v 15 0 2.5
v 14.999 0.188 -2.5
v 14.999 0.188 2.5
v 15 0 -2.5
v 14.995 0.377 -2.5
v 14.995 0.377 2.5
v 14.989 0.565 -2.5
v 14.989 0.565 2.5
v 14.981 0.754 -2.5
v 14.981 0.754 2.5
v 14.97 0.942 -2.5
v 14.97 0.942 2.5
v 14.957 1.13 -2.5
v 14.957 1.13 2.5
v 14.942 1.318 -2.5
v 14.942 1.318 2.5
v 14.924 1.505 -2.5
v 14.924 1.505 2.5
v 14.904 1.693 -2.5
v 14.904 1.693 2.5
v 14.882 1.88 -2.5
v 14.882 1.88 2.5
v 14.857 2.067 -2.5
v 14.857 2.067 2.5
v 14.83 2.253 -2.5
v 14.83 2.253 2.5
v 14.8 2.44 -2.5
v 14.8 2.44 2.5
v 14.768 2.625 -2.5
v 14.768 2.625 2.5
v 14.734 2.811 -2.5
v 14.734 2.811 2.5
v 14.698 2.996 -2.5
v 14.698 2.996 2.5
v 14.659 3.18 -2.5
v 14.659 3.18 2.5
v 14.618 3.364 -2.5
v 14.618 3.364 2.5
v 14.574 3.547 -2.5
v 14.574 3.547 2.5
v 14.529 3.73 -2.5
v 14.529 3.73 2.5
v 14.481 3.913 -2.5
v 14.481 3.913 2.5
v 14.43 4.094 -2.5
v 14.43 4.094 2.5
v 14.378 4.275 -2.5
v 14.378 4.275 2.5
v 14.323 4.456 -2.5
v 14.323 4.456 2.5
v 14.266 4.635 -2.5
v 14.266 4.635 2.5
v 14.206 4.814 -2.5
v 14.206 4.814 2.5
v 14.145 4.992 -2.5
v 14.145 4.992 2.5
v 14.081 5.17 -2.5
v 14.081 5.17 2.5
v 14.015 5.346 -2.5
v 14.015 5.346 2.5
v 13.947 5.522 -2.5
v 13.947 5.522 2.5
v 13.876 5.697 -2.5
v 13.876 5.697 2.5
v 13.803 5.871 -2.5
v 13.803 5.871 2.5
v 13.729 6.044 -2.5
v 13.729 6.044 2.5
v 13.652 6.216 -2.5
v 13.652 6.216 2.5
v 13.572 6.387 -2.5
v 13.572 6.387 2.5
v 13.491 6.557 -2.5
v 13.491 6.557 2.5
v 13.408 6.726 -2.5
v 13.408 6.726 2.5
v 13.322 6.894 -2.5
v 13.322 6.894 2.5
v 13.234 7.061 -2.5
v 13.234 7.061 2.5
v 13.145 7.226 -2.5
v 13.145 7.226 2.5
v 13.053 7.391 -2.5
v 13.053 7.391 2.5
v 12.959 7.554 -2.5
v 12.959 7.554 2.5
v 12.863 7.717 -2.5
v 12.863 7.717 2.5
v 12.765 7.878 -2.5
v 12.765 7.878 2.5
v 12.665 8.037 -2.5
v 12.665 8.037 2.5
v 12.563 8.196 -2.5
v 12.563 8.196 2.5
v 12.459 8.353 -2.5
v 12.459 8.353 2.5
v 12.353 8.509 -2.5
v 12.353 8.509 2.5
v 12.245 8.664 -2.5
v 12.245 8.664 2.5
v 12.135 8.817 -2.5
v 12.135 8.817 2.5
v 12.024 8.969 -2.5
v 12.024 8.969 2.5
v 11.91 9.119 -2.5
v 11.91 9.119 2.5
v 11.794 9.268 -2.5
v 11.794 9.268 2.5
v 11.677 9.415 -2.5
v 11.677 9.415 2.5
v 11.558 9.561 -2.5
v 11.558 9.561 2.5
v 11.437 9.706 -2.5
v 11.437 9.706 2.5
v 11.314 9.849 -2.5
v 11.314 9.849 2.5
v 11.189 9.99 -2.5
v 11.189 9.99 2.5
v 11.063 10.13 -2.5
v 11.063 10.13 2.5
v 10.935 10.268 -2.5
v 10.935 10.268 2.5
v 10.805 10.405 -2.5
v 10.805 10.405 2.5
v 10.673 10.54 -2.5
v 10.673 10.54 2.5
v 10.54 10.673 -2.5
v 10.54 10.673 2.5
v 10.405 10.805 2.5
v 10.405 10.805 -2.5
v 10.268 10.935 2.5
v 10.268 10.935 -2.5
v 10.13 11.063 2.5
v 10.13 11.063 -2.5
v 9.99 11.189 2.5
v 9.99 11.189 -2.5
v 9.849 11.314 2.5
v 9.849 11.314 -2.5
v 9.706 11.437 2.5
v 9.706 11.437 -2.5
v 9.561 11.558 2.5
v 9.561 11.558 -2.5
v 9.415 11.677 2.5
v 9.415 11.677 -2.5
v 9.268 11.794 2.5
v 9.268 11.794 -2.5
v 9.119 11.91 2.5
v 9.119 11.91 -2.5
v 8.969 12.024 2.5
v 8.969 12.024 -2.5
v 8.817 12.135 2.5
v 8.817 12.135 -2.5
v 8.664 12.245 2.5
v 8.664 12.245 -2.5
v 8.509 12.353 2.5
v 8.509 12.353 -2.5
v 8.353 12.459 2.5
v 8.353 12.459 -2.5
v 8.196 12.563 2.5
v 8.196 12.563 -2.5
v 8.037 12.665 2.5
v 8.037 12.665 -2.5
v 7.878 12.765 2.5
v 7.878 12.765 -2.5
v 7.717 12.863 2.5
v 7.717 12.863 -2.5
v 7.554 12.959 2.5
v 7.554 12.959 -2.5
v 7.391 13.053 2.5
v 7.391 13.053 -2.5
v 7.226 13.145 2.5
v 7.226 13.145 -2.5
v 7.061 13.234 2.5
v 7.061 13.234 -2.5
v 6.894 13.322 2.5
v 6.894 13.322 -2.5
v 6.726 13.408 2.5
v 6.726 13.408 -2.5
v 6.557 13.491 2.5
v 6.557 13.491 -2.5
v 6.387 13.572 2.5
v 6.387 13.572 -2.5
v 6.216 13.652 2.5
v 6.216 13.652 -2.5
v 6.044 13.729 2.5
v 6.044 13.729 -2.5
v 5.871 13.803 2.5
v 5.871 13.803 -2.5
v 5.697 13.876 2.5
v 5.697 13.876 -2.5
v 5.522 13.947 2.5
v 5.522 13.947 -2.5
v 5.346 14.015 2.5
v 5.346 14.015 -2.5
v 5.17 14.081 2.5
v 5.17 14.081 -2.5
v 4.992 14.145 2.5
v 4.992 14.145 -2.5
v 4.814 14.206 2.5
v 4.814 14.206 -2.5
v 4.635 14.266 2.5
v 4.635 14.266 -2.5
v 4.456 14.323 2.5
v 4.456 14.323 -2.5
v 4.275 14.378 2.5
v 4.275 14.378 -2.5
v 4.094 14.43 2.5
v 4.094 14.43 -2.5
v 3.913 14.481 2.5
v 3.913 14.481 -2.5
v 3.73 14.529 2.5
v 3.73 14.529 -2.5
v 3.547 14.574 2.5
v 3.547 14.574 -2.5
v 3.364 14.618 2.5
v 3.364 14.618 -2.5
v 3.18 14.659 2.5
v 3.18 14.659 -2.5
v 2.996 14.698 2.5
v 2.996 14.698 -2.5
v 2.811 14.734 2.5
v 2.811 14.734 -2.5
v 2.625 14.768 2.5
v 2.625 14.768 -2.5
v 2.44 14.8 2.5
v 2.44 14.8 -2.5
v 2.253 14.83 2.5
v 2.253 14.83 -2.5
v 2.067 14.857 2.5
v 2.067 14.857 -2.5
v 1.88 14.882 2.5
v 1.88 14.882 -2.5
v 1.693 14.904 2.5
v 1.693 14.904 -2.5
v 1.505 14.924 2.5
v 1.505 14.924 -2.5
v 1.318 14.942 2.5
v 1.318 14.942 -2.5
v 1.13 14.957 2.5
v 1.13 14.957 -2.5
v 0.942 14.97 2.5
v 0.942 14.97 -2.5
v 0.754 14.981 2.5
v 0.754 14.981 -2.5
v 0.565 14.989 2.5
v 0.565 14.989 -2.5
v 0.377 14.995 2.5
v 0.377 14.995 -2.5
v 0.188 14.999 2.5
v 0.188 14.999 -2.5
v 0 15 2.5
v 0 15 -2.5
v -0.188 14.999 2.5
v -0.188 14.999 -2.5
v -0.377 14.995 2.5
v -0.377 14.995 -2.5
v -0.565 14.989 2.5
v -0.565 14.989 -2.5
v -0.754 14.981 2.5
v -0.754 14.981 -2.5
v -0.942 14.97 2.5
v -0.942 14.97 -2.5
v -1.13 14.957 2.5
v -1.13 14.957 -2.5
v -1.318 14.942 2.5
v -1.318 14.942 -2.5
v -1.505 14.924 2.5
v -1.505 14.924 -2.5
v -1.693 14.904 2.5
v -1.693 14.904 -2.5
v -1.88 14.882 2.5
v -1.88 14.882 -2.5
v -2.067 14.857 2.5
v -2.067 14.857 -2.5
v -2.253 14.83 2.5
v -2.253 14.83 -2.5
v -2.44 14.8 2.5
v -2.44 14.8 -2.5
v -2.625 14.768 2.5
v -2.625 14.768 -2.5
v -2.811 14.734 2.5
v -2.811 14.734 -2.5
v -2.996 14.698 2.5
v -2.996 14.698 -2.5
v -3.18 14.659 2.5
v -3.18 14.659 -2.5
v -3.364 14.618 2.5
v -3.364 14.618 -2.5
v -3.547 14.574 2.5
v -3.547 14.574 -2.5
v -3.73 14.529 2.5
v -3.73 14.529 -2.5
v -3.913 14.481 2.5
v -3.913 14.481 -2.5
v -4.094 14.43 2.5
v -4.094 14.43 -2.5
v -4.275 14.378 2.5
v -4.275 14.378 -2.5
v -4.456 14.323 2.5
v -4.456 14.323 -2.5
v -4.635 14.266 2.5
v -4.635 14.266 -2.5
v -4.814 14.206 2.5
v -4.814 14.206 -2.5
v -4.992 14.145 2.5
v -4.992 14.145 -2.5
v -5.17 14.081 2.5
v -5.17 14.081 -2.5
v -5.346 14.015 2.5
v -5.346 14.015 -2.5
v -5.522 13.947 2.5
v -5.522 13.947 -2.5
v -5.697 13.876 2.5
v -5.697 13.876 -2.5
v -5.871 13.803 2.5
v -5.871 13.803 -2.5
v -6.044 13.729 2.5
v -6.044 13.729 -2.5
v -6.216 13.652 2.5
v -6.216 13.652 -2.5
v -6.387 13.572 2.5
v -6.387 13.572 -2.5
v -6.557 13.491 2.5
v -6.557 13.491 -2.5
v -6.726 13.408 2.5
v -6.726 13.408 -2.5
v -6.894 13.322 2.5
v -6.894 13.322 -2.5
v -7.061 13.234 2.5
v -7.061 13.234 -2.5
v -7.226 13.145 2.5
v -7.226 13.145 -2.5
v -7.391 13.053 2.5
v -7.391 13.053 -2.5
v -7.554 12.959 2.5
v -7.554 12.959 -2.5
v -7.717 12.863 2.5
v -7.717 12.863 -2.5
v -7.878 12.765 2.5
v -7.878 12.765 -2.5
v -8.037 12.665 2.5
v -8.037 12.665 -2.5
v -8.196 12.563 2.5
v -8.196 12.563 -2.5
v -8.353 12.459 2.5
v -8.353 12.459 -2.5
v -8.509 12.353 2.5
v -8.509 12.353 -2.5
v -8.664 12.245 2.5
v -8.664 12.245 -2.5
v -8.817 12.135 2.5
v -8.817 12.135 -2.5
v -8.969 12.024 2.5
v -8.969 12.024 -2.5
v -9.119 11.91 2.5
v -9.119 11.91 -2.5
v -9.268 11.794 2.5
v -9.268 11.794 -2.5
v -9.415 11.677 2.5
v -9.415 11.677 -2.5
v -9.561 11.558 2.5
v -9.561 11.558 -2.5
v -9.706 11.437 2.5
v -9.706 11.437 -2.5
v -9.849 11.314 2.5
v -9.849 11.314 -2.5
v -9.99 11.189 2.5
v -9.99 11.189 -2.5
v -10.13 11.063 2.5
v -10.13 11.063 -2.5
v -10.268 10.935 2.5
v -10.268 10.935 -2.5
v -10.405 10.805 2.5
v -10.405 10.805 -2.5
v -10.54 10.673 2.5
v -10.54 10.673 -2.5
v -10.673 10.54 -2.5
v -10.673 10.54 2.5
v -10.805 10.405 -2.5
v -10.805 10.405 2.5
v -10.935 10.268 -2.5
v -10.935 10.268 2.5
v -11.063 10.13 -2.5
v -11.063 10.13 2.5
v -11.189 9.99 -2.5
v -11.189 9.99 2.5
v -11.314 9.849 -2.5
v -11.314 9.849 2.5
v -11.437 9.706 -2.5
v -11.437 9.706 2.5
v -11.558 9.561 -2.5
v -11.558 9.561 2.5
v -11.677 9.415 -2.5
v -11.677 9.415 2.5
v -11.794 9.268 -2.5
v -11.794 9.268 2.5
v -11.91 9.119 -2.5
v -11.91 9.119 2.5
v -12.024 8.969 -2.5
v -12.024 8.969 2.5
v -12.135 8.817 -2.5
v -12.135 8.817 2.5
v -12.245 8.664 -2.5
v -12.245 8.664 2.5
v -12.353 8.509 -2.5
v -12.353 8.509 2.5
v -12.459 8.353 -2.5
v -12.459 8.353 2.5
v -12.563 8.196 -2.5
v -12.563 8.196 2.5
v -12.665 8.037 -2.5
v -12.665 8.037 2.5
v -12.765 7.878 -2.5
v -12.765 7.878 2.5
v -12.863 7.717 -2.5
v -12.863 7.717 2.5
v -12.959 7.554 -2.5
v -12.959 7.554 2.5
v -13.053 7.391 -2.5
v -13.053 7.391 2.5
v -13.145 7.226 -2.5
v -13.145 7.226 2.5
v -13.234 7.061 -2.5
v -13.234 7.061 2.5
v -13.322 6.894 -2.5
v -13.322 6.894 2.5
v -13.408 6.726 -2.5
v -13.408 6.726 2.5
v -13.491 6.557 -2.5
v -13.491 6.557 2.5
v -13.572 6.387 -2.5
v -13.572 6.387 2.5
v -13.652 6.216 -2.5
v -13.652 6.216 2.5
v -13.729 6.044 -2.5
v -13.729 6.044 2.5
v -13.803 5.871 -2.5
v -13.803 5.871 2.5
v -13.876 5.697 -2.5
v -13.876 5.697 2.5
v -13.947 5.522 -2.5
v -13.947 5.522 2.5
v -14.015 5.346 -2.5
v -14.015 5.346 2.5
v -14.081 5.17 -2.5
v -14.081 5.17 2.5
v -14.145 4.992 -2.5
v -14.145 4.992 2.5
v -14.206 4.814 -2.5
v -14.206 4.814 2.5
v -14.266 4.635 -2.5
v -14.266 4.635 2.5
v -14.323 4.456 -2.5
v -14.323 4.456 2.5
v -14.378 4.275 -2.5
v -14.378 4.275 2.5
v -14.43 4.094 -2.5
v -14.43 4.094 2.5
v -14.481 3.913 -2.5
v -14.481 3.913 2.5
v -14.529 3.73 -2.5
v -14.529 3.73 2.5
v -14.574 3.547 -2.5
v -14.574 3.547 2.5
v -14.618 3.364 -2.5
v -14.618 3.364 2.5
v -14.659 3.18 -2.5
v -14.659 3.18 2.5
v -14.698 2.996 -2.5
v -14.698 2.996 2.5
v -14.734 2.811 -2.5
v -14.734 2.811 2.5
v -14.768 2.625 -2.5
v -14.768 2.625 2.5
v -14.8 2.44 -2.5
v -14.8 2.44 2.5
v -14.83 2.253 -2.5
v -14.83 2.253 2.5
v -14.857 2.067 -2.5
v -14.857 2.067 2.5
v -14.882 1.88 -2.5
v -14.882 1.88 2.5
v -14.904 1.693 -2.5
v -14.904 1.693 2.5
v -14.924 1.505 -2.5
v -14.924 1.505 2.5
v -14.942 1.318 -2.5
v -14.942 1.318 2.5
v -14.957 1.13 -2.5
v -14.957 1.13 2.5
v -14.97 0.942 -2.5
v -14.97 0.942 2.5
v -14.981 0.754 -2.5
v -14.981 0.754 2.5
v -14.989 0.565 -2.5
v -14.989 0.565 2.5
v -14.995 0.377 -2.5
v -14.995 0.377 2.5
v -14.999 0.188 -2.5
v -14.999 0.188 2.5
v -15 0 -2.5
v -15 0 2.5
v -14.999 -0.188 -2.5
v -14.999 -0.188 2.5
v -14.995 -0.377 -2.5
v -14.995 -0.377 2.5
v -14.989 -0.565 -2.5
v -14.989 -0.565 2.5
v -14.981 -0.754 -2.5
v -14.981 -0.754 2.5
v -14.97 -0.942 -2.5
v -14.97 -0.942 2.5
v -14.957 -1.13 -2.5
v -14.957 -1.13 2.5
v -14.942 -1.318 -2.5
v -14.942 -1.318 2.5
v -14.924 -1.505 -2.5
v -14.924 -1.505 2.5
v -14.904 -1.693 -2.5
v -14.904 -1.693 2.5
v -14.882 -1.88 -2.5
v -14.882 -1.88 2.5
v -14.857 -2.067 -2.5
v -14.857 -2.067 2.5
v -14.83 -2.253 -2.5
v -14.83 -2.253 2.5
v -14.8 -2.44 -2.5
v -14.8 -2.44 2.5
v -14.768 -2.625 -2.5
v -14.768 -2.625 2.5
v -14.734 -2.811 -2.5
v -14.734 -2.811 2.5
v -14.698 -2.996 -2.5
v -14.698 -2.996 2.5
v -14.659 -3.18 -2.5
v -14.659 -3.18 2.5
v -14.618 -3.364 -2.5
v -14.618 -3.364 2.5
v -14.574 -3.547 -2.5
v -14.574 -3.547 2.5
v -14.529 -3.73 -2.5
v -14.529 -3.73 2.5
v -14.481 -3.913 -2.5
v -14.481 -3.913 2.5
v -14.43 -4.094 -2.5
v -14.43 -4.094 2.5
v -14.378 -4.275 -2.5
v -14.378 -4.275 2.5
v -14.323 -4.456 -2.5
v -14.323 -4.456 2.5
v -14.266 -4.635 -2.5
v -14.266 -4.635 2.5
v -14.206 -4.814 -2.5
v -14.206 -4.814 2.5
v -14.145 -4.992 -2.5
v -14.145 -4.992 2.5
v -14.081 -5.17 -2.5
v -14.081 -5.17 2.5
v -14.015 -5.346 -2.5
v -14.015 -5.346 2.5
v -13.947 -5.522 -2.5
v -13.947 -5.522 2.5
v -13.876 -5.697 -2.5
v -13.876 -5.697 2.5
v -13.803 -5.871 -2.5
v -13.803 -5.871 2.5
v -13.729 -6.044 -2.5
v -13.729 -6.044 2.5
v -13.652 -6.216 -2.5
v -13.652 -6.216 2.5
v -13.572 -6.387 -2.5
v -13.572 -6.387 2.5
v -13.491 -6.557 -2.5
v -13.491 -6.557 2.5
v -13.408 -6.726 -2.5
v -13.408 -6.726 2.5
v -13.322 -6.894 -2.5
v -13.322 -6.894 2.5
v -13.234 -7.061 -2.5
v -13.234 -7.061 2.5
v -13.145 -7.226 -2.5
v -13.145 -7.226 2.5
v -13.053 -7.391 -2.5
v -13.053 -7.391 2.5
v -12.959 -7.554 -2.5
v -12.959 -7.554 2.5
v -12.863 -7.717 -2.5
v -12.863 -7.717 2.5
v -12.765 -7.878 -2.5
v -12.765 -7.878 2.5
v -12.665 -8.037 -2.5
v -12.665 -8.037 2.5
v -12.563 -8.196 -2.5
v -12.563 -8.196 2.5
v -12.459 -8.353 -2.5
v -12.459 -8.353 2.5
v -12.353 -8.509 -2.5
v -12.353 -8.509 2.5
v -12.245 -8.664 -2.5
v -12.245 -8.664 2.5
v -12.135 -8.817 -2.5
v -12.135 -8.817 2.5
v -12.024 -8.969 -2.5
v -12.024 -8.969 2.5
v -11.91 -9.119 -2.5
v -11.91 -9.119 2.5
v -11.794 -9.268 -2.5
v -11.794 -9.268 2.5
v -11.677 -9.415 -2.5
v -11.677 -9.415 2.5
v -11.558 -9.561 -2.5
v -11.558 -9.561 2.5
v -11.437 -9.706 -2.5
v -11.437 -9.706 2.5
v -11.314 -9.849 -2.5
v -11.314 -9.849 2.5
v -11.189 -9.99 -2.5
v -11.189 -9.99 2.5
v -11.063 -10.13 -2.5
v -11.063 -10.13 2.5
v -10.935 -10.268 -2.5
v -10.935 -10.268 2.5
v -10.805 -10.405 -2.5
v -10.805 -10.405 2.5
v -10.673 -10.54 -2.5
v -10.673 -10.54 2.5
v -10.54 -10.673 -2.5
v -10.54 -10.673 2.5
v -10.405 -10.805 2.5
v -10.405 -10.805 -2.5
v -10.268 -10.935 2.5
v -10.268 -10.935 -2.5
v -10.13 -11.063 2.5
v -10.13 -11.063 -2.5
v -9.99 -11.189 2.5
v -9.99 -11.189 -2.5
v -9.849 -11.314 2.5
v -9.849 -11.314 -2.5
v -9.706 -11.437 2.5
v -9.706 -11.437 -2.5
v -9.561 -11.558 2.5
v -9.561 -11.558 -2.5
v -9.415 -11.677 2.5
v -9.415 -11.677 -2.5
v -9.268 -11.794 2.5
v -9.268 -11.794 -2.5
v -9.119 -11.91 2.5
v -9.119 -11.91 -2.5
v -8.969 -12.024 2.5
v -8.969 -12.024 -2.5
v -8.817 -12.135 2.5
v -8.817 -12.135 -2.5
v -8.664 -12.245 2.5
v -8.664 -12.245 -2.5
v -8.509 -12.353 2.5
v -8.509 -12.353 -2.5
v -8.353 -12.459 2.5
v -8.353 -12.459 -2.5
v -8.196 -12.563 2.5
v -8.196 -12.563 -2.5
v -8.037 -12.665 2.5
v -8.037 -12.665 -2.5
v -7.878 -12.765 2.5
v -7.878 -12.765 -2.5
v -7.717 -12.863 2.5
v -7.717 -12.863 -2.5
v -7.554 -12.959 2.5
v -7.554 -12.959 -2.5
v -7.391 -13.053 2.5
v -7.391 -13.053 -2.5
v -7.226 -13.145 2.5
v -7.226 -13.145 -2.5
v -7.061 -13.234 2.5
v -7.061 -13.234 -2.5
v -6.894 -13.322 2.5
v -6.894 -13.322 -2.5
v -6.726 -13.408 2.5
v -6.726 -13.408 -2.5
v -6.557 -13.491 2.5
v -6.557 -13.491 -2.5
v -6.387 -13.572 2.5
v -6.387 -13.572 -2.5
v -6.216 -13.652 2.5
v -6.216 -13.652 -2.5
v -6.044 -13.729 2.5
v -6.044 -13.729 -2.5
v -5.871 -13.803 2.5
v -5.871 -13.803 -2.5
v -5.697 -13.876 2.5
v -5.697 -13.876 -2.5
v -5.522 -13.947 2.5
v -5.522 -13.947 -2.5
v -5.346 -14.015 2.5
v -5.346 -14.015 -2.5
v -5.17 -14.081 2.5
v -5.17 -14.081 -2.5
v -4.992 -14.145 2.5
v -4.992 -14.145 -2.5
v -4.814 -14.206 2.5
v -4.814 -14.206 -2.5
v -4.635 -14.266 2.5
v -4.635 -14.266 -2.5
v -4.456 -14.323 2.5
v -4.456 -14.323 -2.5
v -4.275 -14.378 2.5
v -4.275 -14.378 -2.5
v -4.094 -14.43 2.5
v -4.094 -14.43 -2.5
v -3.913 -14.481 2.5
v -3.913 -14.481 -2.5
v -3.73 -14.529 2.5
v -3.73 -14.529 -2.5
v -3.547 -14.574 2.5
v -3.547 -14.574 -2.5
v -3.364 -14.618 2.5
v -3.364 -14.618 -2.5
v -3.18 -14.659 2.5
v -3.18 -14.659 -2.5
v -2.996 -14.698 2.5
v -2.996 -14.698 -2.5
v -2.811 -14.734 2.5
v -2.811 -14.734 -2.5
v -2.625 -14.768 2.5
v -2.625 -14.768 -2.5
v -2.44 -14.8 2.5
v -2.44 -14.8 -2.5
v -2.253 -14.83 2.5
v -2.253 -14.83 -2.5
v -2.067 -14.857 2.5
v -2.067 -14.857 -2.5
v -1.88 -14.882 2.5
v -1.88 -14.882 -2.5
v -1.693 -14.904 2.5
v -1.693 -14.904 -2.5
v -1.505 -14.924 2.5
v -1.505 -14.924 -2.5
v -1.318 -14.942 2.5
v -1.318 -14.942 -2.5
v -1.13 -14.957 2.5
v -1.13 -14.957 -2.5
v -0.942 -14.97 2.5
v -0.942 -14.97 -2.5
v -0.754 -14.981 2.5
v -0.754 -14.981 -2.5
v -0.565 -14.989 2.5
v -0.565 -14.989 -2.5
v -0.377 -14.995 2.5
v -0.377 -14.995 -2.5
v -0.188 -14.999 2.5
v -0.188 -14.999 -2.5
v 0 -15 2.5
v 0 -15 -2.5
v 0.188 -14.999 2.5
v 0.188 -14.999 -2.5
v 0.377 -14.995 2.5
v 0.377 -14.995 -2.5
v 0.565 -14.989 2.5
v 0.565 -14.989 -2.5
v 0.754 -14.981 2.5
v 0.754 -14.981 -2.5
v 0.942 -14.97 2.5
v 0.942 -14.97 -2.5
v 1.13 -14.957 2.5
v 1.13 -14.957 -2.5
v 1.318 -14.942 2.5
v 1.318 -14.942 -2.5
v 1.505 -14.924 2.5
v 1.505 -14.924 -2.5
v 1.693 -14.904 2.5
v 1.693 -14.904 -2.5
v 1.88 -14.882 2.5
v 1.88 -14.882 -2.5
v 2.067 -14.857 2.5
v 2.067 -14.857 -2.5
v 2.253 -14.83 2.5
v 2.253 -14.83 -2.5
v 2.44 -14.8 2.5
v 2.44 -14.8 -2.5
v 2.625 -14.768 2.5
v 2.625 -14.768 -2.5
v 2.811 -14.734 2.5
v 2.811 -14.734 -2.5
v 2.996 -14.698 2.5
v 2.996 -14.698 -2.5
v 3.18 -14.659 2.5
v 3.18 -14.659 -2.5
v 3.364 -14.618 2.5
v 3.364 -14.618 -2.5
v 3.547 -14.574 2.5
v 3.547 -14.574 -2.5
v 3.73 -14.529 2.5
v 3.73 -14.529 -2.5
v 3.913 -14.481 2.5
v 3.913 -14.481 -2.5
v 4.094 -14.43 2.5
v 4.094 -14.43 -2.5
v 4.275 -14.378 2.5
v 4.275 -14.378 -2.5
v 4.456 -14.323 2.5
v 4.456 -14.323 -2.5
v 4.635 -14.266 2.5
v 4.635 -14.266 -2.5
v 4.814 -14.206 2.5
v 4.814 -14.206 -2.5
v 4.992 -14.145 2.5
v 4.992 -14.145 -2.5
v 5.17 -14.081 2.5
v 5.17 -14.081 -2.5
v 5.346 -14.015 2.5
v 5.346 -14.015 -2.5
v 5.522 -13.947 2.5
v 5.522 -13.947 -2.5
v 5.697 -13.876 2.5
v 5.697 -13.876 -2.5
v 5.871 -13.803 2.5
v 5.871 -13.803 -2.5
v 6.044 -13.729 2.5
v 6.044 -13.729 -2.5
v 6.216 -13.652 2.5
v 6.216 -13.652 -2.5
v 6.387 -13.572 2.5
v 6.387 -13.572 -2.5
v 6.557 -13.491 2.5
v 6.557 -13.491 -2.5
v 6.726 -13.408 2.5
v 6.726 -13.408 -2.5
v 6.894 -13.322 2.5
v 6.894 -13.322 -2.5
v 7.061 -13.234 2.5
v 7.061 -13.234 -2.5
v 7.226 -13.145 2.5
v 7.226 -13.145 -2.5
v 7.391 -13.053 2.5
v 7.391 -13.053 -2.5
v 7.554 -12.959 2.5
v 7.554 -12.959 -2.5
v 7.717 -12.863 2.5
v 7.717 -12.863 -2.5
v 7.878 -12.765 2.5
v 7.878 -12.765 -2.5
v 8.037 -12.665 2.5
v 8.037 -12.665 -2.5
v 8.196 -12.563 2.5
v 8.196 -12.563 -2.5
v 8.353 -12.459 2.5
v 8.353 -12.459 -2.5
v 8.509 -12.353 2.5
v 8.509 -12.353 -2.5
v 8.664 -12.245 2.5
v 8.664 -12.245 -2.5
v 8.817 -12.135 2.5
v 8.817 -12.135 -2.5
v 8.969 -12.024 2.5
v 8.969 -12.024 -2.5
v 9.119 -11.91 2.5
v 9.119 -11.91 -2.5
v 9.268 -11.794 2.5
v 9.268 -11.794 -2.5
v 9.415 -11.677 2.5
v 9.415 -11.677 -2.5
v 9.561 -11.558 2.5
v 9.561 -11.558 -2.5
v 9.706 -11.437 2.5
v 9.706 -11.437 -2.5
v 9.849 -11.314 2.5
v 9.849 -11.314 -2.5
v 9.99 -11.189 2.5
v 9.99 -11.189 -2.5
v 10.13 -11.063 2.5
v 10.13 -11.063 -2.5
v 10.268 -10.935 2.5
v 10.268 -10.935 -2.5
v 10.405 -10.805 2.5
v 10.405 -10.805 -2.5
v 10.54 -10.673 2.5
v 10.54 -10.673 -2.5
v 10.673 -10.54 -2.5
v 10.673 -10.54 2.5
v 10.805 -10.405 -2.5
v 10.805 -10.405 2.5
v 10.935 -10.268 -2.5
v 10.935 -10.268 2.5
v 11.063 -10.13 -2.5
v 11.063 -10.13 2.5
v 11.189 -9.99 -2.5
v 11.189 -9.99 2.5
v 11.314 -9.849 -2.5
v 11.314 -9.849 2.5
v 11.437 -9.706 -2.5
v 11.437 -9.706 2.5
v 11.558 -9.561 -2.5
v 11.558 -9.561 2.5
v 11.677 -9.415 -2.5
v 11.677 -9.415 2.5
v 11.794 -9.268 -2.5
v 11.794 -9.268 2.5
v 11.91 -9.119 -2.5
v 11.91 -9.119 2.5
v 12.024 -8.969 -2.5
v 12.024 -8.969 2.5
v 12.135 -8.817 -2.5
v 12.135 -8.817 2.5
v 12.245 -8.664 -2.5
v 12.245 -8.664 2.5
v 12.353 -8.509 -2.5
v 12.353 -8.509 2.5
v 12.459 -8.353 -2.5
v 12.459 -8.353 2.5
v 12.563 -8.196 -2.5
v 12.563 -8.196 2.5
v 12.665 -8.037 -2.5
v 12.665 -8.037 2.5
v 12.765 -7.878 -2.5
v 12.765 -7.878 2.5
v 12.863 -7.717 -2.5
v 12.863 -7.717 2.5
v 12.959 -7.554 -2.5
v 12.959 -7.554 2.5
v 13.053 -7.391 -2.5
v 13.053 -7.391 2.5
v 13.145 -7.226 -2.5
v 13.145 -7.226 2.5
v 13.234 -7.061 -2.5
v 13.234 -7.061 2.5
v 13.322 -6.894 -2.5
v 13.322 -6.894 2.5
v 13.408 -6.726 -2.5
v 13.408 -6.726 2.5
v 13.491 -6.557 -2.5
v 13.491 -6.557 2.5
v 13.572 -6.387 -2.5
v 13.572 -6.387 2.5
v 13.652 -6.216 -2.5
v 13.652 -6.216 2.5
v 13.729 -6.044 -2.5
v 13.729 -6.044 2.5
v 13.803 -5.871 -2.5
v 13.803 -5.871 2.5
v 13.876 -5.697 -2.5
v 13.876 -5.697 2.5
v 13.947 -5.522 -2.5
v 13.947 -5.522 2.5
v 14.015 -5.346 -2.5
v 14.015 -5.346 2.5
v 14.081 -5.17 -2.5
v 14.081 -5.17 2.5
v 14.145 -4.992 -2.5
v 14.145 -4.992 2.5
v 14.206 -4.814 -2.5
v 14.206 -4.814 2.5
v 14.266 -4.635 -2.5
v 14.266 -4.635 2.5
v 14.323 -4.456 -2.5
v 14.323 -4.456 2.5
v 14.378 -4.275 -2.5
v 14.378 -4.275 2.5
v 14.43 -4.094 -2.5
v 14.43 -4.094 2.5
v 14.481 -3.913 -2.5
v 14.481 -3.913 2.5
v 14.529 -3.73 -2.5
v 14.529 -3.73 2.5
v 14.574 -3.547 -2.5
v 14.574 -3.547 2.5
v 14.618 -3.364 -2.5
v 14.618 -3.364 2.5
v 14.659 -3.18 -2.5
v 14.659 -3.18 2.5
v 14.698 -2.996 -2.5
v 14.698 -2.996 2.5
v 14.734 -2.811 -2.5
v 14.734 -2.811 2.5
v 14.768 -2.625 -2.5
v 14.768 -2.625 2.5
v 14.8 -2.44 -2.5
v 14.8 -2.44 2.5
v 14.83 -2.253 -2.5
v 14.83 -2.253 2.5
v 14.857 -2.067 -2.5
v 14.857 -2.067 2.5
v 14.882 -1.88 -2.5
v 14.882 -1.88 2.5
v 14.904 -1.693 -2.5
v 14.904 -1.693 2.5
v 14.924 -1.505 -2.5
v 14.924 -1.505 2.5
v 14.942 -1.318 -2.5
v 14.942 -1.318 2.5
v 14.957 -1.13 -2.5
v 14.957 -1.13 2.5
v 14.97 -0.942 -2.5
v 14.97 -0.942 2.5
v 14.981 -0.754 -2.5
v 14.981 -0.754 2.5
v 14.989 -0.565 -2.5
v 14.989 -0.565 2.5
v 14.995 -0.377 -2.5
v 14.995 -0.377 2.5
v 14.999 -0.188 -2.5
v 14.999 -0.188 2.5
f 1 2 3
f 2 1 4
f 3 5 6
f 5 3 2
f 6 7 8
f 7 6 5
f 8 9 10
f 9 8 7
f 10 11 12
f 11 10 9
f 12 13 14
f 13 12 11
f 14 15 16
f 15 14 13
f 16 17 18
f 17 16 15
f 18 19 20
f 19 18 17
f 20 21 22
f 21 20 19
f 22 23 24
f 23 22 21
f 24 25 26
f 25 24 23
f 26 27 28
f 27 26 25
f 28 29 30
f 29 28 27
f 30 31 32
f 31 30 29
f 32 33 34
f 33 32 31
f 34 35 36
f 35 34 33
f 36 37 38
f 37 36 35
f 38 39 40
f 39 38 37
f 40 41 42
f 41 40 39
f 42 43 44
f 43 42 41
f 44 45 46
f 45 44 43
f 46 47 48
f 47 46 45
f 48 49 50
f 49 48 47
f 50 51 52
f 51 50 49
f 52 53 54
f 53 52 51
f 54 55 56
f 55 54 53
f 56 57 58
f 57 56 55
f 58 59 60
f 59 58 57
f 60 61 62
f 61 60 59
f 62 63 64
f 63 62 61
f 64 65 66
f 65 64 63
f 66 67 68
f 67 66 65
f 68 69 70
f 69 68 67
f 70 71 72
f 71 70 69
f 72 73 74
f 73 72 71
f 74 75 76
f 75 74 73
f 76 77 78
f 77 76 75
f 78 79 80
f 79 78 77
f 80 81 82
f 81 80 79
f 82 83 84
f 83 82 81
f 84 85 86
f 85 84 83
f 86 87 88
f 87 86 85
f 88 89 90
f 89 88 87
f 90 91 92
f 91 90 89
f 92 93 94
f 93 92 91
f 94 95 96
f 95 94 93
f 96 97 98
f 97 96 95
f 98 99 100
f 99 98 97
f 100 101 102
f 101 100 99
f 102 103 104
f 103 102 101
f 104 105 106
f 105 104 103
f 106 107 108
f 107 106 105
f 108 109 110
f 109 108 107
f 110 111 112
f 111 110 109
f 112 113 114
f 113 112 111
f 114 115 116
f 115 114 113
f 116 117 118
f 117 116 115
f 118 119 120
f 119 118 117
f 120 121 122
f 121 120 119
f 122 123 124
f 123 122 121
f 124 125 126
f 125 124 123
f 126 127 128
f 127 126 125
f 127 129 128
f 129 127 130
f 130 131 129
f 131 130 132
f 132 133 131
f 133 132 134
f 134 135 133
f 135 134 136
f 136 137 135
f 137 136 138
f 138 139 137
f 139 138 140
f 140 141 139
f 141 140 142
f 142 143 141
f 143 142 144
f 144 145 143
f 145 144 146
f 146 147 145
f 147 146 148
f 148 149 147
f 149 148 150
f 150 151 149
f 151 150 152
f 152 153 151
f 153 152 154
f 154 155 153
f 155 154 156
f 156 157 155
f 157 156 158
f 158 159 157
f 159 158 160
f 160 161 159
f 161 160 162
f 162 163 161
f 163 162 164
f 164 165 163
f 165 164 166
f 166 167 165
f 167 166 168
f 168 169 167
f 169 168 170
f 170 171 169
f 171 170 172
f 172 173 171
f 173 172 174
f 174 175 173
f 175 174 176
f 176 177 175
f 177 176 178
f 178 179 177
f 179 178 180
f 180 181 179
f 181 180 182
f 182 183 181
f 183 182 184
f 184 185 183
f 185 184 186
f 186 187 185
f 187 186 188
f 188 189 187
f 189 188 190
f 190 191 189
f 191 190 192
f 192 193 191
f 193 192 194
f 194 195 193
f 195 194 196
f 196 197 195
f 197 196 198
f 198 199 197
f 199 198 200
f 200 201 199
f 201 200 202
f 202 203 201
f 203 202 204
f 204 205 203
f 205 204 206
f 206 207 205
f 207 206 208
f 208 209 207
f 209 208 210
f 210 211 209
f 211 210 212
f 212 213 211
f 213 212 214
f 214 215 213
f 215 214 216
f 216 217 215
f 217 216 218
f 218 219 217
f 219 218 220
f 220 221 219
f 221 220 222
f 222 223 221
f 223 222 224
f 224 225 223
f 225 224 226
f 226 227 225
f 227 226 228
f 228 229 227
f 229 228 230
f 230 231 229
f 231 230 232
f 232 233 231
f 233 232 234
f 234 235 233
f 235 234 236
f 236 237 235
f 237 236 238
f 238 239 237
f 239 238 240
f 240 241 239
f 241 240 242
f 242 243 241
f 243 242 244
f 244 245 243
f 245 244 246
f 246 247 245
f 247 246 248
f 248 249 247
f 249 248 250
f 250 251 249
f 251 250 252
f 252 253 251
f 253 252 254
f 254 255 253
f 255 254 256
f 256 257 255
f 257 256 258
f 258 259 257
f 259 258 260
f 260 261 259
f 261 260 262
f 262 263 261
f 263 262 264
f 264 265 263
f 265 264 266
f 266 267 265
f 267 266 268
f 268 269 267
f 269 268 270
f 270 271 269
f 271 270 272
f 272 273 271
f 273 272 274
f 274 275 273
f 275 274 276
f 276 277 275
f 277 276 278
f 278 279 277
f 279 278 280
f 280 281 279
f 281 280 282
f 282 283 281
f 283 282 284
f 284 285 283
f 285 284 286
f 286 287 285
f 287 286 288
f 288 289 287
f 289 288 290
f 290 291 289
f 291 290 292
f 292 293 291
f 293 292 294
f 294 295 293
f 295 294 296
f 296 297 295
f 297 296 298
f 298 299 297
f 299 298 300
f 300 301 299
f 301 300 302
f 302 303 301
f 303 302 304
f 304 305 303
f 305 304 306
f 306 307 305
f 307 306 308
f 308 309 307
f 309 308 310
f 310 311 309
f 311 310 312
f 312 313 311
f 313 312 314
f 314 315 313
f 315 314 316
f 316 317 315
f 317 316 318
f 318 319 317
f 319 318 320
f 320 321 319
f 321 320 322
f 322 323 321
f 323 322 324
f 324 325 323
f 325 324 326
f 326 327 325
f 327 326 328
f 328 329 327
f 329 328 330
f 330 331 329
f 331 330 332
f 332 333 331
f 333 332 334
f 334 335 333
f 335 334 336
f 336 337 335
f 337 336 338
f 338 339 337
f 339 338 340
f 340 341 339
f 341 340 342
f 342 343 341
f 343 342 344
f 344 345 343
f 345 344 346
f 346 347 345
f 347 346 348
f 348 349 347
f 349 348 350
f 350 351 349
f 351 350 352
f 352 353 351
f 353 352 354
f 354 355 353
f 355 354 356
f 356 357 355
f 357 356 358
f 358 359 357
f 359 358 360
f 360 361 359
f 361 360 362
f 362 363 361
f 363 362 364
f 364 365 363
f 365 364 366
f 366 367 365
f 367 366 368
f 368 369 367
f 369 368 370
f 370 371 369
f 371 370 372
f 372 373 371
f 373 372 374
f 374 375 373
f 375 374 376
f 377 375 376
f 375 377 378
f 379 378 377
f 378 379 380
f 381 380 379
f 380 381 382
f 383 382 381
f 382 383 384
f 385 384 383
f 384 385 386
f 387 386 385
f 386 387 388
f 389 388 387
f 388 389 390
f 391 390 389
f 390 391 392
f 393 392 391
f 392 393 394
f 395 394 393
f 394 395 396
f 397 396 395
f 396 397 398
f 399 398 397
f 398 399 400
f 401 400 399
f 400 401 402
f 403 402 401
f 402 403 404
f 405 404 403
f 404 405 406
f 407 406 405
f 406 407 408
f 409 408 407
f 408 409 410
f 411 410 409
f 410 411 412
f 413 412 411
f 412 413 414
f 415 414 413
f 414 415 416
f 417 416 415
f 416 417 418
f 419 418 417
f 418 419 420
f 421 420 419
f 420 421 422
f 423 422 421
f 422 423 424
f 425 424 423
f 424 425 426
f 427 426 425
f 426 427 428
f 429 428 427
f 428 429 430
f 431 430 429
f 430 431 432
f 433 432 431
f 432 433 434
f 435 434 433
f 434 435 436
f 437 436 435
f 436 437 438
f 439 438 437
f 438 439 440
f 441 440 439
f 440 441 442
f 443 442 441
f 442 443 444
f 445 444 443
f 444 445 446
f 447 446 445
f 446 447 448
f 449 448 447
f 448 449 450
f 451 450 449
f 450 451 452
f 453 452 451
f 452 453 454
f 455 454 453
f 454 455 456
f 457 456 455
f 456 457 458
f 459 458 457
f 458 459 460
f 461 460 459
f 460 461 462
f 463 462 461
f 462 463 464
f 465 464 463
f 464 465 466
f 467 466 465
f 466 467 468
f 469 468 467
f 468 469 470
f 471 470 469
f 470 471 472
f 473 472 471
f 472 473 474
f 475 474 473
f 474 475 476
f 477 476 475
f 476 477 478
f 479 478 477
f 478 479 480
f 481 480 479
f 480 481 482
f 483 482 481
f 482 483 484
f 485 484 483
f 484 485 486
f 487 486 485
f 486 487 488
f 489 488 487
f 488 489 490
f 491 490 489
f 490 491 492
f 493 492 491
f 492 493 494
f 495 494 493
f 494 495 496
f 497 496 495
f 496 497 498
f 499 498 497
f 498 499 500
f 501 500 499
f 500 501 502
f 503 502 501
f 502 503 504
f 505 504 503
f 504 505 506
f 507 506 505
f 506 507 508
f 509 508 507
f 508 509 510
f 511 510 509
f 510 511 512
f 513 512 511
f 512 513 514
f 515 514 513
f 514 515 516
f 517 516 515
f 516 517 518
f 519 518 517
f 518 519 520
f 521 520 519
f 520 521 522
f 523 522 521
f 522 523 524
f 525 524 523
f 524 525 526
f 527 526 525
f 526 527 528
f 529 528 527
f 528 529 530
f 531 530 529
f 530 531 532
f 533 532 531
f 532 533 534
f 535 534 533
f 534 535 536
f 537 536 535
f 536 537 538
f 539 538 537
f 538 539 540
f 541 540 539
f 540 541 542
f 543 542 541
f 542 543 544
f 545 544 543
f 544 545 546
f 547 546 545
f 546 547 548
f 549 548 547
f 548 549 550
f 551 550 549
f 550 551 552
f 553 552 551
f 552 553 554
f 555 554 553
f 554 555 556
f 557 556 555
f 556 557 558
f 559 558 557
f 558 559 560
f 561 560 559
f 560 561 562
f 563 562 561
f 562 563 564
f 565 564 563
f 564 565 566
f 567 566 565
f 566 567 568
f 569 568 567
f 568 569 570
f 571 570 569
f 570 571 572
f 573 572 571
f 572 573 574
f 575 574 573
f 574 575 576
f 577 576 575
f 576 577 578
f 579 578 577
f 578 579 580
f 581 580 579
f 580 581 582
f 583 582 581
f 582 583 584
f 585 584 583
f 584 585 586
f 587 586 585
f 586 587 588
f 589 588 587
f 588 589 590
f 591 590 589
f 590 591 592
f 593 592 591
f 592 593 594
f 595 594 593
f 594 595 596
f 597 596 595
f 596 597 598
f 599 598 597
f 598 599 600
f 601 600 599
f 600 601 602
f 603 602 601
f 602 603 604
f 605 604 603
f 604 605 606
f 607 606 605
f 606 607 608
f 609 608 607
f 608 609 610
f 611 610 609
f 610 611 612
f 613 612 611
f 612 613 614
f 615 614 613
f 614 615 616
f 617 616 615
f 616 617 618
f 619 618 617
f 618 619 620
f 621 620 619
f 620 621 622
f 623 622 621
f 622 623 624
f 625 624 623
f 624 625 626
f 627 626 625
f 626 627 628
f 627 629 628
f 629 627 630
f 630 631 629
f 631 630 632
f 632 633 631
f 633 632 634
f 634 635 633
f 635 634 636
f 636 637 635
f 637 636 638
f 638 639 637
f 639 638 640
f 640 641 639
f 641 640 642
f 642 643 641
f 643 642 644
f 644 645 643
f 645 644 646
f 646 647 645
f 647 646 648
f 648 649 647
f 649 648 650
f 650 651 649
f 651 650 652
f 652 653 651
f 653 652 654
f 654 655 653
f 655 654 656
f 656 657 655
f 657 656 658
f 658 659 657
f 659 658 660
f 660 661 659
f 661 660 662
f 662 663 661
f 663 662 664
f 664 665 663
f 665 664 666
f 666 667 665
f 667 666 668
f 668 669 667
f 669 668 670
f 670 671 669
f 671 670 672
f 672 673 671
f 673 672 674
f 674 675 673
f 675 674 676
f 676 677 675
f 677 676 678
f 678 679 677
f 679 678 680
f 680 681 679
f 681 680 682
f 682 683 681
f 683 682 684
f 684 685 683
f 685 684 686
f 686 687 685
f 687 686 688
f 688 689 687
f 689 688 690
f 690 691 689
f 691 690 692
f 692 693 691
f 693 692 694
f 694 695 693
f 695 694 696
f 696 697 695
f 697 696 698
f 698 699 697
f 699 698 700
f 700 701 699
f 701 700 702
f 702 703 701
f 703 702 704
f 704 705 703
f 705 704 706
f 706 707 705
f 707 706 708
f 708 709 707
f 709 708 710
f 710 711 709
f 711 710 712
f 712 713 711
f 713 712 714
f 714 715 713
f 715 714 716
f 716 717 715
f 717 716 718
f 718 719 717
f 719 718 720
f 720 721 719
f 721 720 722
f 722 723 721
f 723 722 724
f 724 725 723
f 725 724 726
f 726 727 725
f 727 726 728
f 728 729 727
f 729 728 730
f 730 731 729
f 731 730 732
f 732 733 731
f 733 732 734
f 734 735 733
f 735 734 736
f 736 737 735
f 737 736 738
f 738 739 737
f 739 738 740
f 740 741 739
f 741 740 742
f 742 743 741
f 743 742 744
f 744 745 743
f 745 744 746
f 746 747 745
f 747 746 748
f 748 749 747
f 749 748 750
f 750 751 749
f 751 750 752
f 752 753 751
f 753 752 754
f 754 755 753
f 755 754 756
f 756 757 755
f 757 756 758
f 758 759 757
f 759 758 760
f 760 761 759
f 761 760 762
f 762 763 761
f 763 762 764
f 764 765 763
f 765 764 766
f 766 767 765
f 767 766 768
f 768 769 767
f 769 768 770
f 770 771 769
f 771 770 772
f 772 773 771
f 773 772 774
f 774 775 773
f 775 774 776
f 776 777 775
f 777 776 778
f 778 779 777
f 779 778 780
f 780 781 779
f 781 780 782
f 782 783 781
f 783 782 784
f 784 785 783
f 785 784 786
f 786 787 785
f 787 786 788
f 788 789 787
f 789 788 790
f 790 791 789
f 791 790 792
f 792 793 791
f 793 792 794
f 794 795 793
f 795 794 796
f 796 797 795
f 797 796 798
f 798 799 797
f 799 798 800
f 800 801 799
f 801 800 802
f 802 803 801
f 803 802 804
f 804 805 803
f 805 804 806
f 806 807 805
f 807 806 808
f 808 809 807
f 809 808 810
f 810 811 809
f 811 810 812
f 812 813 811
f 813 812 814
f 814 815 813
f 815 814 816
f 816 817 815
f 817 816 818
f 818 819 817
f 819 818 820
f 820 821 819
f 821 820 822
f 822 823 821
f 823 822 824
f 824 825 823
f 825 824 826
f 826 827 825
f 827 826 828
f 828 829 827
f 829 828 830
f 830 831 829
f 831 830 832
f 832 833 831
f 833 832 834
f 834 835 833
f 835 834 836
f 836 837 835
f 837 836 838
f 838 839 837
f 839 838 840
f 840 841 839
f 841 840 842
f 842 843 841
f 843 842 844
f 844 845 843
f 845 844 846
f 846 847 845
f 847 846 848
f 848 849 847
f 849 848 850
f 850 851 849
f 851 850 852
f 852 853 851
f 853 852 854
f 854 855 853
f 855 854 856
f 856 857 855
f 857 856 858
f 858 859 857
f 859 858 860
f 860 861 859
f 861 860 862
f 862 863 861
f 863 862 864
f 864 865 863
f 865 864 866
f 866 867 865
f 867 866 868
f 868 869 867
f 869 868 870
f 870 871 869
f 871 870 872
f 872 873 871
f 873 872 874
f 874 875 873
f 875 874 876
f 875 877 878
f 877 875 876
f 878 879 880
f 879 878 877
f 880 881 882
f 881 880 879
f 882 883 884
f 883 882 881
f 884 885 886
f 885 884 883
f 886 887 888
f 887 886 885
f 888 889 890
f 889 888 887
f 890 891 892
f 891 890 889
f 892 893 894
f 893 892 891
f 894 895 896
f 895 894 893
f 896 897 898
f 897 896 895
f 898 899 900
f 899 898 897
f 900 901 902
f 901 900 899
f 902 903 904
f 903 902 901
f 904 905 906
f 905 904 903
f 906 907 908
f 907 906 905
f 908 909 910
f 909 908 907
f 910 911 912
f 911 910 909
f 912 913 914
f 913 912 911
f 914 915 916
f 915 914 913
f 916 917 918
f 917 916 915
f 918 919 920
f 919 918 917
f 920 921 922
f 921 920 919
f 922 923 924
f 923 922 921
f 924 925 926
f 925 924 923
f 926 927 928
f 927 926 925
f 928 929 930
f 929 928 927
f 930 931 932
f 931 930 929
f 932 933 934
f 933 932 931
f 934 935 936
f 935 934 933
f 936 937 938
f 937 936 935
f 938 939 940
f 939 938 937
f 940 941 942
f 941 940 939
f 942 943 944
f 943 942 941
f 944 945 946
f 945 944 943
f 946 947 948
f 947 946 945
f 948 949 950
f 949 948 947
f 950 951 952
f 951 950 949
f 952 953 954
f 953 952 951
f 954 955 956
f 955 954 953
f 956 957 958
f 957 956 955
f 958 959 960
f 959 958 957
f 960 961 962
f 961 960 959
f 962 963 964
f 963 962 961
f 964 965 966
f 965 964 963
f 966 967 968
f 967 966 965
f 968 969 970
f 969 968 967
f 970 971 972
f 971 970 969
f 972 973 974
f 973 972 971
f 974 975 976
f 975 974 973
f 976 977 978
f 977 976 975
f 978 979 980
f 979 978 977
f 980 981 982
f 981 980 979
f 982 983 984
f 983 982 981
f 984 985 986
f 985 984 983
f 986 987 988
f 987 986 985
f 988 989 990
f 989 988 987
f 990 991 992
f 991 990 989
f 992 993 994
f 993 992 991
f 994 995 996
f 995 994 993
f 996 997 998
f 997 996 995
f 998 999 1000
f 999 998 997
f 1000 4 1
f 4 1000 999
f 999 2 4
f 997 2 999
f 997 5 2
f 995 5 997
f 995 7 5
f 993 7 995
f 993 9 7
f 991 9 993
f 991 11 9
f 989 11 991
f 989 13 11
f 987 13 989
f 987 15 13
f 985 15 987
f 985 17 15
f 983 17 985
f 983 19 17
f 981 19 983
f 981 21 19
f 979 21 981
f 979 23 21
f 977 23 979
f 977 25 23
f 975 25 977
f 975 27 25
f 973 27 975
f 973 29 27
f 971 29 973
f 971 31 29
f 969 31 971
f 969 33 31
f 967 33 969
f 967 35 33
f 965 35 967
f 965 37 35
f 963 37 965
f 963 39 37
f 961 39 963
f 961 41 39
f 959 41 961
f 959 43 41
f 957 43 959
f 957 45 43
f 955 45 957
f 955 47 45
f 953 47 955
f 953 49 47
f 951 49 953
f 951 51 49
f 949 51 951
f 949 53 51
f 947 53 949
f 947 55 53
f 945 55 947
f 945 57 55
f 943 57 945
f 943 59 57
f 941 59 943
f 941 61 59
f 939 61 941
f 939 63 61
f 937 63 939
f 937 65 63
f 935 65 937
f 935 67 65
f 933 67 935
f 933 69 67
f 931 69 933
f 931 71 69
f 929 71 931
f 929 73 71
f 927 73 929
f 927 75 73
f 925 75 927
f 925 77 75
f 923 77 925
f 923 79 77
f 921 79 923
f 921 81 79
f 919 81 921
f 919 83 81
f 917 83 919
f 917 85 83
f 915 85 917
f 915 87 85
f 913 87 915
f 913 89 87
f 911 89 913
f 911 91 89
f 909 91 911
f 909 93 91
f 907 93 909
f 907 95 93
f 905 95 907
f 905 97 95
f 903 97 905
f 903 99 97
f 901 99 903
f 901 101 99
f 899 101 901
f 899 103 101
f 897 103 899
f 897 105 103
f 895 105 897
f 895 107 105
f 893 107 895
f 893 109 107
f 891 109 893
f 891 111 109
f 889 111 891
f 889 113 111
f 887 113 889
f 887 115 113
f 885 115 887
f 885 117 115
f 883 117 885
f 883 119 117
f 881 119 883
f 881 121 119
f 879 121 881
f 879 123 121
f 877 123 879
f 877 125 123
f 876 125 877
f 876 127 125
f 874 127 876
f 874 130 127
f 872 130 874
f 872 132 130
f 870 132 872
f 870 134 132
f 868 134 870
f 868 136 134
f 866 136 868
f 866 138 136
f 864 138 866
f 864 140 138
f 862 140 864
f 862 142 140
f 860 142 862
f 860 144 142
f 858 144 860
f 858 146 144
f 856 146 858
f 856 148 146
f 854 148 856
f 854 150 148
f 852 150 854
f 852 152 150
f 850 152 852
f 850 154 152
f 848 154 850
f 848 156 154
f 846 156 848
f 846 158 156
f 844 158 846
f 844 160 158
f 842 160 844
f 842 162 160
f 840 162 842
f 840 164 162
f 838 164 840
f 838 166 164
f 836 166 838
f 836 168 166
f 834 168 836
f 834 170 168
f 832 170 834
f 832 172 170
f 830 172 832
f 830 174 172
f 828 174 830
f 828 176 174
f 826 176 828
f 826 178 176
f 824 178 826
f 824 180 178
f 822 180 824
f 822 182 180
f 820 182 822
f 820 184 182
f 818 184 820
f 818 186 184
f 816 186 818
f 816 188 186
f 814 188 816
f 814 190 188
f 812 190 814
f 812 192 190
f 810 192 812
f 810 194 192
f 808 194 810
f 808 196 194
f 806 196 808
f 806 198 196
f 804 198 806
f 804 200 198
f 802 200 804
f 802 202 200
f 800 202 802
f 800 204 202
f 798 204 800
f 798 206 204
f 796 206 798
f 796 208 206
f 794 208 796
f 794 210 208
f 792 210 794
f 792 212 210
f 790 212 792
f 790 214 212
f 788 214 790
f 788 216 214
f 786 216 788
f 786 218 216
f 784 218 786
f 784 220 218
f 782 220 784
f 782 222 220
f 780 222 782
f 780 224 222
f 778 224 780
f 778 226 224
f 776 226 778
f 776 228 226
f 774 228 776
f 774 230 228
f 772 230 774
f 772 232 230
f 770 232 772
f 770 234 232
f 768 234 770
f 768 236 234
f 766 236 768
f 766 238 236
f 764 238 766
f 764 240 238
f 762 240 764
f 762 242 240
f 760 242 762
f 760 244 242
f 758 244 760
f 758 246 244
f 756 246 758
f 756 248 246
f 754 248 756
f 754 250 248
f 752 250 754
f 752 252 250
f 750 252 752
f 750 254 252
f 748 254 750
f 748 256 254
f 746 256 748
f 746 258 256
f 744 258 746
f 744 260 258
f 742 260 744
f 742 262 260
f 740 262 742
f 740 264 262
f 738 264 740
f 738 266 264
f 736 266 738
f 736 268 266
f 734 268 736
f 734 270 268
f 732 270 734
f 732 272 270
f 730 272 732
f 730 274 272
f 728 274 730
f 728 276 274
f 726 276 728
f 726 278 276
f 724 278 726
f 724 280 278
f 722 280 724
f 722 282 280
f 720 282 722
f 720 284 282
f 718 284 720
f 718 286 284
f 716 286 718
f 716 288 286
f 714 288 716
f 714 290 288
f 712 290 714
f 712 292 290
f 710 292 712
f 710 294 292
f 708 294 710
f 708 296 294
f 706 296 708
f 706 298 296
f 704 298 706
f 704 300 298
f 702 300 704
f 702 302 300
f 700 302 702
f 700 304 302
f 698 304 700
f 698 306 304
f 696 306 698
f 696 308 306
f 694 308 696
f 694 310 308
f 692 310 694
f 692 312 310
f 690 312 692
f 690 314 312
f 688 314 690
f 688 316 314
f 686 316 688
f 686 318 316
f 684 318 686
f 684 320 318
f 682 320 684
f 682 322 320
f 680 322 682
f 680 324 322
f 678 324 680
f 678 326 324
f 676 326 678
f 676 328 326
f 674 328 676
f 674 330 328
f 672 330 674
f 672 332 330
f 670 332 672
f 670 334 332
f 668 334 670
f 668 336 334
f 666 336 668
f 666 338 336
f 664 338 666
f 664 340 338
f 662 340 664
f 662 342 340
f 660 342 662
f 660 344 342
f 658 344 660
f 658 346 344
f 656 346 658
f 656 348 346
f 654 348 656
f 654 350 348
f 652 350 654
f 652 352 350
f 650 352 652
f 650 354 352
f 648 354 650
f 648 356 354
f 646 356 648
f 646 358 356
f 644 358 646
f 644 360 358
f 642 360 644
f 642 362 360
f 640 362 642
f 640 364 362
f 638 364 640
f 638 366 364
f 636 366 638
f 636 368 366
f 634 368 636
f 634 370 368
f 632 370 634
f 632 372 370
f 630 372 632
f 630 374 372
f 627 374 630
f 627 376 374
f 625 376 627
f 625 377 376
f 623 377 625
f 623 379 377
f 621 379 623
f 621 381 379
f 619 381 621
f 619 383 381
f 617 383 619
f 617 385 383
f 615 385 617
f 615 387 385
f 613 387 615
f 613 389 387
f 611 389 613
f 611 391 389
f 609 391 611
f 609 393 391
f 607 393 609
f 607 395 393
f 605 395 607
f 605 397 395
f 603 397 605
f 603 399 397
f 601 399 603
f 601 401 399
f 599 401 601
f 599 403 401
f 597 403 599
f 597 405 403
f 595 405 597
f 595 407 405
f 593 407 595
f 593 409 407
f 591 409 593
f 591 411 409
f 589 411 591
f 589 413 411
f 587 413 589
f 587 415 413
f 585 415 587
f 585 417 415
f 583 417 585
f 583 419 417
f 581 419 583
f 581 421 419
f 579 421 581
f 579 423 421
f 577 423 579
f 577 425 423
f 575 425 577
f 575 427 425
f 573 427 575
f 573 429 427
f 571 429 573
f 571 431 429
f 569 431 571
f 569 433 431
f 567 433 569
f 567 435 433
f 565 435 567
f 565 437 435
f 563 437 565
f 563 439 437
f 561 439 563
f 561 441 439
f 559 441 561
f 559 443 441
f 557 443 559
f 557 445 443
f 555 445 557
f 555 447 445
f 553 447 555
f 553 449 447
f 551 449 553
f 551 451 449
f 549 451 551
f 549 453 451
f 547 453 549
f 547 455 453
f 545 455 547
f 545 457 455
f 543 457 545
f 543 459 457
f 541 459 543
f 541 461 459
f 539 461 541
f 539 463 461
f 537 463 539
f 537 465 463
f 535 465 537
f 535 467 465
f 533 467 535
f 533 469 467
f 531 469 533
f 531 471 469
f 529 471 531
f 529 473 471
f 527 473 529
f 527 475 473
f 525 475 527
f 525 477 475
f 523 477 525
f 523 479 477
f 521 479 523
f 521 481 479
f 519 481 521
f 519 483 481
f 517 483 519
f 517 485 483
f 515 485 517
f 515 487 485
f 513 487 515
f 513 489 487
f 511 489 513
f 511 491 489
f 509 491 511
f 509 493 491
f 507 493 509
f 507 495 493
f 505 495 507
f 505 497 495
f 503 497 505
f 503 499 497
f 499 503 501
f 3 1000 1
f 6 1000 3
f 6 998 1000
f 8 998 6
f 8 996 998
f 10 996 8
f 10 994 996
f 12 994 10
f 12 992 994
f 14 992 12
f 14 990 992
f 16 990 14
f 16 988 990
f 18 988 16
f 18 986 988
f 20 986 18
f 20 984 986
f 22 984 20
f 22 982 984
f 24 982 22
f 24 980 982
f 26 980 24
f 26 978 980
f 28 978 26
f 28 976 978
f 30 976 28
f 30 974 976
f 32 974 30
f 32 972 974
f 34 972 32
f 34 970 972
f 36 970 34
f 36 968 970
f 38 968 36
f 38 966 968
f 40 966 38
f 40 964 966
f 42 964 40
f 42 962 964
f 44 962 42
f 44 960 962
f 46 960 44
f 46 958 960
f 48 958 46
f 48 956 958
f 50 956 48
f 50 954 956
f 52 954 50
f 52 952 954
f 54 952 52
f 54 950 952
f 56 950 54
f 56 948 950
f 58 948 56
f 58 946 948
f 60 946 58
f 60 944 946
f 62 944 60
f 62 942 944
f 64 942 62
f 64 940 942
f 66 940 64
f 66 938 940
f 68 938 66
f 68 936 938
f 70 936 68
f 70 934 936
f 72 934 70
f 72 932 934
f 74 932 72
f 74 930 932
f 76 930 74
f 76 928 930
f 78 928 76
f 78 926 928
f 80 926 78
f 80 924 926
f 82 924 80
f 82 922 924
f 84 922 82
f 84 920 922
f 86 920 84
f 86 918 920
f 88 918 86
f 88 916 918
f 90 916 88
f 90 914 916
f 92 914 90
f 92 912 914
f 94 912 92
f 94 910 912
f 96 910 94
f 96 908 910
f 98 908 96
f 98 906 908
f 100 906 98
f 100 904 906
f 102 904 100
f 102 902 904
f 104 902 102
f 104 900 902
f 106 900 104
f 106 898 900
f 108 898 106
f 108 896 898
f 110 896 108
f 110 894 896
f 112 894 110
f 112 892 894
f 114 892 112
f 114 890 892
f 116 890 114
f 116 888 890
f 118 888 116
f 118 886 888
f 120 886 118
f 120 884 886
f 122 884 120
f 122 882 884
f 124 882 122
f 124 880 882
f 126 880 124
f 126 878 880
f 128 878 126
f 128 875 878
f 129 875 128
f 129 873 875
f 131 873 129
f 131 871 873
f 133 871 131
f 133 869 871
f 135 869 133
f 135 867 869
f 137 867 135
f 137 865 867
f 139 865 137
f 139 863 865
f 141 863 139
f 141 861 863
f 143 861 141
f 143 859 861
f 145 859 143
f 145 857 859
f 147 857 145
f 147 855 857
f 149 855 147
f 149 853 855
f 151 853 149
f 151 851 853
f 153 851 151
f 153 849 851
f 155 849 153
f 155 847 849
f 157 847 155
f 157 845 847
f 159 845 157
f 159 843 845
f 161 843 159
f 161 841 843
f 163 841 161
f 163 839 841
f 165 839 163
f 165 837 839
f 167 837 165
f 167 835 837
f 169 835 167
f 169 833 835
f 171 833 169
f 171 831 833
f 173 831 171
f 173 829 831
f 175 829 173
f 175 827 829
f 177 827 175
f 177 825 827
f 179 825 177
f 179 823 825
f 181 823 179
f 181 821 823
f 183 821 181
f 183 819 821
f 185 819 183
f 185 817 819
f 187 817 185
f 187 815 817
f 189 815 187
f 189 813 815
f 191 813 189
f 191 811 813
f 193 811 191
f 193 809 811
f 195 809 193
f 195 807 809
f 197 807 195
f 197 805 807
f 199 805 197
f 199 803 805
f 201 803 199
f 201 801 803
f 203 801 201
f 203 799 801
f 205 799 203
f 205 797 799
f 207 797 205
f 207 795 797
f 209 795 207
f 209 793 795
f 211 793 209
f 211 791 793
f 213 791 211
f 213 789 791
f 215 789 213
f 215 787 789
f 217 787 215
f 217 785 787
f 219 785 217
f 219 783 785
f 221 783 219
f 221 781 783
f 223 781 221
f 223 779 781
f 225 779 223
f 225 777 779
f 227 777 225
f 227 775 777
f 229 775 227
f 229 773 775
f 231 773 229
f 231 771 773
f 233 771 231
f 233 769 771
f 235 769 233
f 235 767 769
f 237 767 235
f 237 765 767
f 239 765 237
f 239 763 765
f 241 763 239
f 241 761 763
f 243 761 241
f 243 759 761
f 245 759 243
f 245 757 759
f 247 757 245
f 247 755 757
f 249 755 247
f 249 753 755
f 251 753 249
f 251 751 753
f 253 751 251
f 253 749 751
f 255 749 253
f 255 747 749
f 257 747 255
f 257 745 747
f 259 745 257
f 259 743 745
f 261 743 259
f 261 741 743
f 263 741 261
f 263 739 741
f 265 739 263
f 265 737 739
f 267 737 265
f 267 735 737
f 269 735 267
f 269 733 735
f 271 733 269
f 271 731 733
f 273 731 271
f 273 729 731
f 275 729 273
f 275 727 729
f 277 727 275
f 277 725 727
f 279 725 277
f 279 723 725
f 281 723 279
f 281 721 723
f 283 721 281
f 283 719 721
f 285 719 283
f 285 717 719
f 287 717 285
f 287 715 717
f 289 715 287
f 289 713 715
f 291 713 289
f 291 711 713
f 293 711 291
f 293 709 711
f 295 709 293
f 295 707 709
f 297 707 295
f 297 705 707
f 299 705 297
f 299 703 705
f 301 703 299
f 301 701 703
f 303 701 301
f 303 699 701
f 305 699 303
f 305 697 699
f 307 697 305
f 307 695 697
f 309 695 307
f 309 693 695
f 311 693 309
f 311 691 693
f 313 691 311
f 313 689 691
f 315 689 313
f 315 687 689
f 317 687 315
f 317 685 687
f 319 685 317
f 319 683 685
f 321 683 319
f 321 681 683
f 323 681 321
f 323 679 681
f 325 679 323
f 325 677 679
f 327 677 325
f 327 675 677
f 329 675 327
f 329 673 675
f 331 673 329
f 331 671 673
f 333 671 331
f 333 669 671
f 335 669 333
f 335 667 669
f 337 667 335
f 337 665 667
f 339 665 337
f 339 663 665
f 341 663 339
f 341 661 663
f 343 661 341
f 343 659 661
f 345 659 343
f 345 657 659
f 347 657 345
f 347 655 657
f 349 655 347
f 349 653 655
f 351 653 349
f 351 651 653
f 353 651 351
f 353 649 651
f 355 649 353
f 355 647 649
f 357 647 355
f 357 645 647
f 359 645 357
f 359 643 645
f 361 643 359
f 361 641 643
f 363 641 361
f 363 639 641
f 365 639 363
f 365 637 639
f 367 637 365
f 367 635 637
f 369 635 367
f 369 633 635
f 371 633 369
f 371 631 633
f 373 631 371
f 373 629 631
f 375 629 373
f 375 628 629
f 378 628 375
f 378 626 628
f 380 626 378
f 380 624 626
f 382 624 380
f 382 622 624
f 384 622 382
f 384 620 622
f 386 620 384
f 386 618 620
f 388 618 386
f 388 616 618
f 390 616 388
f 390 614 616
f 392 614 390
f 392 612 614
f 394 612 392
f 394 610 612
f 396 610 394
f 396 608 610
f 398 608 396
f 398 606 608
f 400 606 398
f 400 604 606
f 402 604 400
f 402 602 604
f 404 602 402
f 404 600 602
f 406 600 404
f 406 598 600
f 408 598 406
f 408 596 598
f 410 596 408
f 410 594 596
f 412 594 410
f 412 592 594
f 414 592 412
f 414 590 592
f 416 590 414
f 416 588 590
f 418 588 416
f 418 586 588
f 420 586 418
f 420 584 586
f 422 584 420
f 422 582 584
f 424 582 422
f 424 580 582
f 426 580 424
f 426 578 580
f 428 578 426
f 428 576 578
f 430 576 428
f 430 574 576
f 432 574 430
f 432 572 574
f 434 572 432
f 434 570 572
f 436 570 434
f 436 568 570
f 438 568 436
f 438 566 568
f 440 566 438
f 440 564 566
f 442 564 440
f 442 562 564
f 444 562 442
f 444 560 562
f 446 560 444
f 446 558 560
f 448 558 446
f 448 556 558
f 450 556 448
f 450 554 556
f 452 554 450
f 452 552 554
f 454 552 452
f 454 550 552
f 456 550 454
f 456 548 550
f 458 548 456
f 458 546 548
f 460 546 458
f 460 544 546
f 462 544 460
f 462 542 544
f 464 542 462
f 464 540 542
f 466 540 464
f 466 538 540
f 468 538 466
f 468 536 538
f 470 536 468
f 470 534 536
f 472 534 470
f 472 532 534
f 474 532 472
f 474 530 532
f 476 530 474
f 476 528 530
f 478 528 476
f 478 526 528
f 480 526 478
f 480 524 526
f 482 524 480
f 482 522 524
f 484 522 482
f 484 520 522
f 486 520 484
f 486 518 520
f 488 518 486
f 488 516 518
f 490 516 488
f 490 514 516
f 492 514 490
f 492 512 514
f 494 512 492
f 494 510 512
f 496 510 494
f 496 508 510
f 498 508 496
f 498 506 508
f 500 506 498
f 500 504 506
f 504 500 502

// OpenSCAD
cylind(0,0,0,5,15);

module cylind(x,y,z, cylh, cylr)
{
translate([x,y,z])cylinder(h=cylh, r=cylr, center=true); $fn=500;
}
